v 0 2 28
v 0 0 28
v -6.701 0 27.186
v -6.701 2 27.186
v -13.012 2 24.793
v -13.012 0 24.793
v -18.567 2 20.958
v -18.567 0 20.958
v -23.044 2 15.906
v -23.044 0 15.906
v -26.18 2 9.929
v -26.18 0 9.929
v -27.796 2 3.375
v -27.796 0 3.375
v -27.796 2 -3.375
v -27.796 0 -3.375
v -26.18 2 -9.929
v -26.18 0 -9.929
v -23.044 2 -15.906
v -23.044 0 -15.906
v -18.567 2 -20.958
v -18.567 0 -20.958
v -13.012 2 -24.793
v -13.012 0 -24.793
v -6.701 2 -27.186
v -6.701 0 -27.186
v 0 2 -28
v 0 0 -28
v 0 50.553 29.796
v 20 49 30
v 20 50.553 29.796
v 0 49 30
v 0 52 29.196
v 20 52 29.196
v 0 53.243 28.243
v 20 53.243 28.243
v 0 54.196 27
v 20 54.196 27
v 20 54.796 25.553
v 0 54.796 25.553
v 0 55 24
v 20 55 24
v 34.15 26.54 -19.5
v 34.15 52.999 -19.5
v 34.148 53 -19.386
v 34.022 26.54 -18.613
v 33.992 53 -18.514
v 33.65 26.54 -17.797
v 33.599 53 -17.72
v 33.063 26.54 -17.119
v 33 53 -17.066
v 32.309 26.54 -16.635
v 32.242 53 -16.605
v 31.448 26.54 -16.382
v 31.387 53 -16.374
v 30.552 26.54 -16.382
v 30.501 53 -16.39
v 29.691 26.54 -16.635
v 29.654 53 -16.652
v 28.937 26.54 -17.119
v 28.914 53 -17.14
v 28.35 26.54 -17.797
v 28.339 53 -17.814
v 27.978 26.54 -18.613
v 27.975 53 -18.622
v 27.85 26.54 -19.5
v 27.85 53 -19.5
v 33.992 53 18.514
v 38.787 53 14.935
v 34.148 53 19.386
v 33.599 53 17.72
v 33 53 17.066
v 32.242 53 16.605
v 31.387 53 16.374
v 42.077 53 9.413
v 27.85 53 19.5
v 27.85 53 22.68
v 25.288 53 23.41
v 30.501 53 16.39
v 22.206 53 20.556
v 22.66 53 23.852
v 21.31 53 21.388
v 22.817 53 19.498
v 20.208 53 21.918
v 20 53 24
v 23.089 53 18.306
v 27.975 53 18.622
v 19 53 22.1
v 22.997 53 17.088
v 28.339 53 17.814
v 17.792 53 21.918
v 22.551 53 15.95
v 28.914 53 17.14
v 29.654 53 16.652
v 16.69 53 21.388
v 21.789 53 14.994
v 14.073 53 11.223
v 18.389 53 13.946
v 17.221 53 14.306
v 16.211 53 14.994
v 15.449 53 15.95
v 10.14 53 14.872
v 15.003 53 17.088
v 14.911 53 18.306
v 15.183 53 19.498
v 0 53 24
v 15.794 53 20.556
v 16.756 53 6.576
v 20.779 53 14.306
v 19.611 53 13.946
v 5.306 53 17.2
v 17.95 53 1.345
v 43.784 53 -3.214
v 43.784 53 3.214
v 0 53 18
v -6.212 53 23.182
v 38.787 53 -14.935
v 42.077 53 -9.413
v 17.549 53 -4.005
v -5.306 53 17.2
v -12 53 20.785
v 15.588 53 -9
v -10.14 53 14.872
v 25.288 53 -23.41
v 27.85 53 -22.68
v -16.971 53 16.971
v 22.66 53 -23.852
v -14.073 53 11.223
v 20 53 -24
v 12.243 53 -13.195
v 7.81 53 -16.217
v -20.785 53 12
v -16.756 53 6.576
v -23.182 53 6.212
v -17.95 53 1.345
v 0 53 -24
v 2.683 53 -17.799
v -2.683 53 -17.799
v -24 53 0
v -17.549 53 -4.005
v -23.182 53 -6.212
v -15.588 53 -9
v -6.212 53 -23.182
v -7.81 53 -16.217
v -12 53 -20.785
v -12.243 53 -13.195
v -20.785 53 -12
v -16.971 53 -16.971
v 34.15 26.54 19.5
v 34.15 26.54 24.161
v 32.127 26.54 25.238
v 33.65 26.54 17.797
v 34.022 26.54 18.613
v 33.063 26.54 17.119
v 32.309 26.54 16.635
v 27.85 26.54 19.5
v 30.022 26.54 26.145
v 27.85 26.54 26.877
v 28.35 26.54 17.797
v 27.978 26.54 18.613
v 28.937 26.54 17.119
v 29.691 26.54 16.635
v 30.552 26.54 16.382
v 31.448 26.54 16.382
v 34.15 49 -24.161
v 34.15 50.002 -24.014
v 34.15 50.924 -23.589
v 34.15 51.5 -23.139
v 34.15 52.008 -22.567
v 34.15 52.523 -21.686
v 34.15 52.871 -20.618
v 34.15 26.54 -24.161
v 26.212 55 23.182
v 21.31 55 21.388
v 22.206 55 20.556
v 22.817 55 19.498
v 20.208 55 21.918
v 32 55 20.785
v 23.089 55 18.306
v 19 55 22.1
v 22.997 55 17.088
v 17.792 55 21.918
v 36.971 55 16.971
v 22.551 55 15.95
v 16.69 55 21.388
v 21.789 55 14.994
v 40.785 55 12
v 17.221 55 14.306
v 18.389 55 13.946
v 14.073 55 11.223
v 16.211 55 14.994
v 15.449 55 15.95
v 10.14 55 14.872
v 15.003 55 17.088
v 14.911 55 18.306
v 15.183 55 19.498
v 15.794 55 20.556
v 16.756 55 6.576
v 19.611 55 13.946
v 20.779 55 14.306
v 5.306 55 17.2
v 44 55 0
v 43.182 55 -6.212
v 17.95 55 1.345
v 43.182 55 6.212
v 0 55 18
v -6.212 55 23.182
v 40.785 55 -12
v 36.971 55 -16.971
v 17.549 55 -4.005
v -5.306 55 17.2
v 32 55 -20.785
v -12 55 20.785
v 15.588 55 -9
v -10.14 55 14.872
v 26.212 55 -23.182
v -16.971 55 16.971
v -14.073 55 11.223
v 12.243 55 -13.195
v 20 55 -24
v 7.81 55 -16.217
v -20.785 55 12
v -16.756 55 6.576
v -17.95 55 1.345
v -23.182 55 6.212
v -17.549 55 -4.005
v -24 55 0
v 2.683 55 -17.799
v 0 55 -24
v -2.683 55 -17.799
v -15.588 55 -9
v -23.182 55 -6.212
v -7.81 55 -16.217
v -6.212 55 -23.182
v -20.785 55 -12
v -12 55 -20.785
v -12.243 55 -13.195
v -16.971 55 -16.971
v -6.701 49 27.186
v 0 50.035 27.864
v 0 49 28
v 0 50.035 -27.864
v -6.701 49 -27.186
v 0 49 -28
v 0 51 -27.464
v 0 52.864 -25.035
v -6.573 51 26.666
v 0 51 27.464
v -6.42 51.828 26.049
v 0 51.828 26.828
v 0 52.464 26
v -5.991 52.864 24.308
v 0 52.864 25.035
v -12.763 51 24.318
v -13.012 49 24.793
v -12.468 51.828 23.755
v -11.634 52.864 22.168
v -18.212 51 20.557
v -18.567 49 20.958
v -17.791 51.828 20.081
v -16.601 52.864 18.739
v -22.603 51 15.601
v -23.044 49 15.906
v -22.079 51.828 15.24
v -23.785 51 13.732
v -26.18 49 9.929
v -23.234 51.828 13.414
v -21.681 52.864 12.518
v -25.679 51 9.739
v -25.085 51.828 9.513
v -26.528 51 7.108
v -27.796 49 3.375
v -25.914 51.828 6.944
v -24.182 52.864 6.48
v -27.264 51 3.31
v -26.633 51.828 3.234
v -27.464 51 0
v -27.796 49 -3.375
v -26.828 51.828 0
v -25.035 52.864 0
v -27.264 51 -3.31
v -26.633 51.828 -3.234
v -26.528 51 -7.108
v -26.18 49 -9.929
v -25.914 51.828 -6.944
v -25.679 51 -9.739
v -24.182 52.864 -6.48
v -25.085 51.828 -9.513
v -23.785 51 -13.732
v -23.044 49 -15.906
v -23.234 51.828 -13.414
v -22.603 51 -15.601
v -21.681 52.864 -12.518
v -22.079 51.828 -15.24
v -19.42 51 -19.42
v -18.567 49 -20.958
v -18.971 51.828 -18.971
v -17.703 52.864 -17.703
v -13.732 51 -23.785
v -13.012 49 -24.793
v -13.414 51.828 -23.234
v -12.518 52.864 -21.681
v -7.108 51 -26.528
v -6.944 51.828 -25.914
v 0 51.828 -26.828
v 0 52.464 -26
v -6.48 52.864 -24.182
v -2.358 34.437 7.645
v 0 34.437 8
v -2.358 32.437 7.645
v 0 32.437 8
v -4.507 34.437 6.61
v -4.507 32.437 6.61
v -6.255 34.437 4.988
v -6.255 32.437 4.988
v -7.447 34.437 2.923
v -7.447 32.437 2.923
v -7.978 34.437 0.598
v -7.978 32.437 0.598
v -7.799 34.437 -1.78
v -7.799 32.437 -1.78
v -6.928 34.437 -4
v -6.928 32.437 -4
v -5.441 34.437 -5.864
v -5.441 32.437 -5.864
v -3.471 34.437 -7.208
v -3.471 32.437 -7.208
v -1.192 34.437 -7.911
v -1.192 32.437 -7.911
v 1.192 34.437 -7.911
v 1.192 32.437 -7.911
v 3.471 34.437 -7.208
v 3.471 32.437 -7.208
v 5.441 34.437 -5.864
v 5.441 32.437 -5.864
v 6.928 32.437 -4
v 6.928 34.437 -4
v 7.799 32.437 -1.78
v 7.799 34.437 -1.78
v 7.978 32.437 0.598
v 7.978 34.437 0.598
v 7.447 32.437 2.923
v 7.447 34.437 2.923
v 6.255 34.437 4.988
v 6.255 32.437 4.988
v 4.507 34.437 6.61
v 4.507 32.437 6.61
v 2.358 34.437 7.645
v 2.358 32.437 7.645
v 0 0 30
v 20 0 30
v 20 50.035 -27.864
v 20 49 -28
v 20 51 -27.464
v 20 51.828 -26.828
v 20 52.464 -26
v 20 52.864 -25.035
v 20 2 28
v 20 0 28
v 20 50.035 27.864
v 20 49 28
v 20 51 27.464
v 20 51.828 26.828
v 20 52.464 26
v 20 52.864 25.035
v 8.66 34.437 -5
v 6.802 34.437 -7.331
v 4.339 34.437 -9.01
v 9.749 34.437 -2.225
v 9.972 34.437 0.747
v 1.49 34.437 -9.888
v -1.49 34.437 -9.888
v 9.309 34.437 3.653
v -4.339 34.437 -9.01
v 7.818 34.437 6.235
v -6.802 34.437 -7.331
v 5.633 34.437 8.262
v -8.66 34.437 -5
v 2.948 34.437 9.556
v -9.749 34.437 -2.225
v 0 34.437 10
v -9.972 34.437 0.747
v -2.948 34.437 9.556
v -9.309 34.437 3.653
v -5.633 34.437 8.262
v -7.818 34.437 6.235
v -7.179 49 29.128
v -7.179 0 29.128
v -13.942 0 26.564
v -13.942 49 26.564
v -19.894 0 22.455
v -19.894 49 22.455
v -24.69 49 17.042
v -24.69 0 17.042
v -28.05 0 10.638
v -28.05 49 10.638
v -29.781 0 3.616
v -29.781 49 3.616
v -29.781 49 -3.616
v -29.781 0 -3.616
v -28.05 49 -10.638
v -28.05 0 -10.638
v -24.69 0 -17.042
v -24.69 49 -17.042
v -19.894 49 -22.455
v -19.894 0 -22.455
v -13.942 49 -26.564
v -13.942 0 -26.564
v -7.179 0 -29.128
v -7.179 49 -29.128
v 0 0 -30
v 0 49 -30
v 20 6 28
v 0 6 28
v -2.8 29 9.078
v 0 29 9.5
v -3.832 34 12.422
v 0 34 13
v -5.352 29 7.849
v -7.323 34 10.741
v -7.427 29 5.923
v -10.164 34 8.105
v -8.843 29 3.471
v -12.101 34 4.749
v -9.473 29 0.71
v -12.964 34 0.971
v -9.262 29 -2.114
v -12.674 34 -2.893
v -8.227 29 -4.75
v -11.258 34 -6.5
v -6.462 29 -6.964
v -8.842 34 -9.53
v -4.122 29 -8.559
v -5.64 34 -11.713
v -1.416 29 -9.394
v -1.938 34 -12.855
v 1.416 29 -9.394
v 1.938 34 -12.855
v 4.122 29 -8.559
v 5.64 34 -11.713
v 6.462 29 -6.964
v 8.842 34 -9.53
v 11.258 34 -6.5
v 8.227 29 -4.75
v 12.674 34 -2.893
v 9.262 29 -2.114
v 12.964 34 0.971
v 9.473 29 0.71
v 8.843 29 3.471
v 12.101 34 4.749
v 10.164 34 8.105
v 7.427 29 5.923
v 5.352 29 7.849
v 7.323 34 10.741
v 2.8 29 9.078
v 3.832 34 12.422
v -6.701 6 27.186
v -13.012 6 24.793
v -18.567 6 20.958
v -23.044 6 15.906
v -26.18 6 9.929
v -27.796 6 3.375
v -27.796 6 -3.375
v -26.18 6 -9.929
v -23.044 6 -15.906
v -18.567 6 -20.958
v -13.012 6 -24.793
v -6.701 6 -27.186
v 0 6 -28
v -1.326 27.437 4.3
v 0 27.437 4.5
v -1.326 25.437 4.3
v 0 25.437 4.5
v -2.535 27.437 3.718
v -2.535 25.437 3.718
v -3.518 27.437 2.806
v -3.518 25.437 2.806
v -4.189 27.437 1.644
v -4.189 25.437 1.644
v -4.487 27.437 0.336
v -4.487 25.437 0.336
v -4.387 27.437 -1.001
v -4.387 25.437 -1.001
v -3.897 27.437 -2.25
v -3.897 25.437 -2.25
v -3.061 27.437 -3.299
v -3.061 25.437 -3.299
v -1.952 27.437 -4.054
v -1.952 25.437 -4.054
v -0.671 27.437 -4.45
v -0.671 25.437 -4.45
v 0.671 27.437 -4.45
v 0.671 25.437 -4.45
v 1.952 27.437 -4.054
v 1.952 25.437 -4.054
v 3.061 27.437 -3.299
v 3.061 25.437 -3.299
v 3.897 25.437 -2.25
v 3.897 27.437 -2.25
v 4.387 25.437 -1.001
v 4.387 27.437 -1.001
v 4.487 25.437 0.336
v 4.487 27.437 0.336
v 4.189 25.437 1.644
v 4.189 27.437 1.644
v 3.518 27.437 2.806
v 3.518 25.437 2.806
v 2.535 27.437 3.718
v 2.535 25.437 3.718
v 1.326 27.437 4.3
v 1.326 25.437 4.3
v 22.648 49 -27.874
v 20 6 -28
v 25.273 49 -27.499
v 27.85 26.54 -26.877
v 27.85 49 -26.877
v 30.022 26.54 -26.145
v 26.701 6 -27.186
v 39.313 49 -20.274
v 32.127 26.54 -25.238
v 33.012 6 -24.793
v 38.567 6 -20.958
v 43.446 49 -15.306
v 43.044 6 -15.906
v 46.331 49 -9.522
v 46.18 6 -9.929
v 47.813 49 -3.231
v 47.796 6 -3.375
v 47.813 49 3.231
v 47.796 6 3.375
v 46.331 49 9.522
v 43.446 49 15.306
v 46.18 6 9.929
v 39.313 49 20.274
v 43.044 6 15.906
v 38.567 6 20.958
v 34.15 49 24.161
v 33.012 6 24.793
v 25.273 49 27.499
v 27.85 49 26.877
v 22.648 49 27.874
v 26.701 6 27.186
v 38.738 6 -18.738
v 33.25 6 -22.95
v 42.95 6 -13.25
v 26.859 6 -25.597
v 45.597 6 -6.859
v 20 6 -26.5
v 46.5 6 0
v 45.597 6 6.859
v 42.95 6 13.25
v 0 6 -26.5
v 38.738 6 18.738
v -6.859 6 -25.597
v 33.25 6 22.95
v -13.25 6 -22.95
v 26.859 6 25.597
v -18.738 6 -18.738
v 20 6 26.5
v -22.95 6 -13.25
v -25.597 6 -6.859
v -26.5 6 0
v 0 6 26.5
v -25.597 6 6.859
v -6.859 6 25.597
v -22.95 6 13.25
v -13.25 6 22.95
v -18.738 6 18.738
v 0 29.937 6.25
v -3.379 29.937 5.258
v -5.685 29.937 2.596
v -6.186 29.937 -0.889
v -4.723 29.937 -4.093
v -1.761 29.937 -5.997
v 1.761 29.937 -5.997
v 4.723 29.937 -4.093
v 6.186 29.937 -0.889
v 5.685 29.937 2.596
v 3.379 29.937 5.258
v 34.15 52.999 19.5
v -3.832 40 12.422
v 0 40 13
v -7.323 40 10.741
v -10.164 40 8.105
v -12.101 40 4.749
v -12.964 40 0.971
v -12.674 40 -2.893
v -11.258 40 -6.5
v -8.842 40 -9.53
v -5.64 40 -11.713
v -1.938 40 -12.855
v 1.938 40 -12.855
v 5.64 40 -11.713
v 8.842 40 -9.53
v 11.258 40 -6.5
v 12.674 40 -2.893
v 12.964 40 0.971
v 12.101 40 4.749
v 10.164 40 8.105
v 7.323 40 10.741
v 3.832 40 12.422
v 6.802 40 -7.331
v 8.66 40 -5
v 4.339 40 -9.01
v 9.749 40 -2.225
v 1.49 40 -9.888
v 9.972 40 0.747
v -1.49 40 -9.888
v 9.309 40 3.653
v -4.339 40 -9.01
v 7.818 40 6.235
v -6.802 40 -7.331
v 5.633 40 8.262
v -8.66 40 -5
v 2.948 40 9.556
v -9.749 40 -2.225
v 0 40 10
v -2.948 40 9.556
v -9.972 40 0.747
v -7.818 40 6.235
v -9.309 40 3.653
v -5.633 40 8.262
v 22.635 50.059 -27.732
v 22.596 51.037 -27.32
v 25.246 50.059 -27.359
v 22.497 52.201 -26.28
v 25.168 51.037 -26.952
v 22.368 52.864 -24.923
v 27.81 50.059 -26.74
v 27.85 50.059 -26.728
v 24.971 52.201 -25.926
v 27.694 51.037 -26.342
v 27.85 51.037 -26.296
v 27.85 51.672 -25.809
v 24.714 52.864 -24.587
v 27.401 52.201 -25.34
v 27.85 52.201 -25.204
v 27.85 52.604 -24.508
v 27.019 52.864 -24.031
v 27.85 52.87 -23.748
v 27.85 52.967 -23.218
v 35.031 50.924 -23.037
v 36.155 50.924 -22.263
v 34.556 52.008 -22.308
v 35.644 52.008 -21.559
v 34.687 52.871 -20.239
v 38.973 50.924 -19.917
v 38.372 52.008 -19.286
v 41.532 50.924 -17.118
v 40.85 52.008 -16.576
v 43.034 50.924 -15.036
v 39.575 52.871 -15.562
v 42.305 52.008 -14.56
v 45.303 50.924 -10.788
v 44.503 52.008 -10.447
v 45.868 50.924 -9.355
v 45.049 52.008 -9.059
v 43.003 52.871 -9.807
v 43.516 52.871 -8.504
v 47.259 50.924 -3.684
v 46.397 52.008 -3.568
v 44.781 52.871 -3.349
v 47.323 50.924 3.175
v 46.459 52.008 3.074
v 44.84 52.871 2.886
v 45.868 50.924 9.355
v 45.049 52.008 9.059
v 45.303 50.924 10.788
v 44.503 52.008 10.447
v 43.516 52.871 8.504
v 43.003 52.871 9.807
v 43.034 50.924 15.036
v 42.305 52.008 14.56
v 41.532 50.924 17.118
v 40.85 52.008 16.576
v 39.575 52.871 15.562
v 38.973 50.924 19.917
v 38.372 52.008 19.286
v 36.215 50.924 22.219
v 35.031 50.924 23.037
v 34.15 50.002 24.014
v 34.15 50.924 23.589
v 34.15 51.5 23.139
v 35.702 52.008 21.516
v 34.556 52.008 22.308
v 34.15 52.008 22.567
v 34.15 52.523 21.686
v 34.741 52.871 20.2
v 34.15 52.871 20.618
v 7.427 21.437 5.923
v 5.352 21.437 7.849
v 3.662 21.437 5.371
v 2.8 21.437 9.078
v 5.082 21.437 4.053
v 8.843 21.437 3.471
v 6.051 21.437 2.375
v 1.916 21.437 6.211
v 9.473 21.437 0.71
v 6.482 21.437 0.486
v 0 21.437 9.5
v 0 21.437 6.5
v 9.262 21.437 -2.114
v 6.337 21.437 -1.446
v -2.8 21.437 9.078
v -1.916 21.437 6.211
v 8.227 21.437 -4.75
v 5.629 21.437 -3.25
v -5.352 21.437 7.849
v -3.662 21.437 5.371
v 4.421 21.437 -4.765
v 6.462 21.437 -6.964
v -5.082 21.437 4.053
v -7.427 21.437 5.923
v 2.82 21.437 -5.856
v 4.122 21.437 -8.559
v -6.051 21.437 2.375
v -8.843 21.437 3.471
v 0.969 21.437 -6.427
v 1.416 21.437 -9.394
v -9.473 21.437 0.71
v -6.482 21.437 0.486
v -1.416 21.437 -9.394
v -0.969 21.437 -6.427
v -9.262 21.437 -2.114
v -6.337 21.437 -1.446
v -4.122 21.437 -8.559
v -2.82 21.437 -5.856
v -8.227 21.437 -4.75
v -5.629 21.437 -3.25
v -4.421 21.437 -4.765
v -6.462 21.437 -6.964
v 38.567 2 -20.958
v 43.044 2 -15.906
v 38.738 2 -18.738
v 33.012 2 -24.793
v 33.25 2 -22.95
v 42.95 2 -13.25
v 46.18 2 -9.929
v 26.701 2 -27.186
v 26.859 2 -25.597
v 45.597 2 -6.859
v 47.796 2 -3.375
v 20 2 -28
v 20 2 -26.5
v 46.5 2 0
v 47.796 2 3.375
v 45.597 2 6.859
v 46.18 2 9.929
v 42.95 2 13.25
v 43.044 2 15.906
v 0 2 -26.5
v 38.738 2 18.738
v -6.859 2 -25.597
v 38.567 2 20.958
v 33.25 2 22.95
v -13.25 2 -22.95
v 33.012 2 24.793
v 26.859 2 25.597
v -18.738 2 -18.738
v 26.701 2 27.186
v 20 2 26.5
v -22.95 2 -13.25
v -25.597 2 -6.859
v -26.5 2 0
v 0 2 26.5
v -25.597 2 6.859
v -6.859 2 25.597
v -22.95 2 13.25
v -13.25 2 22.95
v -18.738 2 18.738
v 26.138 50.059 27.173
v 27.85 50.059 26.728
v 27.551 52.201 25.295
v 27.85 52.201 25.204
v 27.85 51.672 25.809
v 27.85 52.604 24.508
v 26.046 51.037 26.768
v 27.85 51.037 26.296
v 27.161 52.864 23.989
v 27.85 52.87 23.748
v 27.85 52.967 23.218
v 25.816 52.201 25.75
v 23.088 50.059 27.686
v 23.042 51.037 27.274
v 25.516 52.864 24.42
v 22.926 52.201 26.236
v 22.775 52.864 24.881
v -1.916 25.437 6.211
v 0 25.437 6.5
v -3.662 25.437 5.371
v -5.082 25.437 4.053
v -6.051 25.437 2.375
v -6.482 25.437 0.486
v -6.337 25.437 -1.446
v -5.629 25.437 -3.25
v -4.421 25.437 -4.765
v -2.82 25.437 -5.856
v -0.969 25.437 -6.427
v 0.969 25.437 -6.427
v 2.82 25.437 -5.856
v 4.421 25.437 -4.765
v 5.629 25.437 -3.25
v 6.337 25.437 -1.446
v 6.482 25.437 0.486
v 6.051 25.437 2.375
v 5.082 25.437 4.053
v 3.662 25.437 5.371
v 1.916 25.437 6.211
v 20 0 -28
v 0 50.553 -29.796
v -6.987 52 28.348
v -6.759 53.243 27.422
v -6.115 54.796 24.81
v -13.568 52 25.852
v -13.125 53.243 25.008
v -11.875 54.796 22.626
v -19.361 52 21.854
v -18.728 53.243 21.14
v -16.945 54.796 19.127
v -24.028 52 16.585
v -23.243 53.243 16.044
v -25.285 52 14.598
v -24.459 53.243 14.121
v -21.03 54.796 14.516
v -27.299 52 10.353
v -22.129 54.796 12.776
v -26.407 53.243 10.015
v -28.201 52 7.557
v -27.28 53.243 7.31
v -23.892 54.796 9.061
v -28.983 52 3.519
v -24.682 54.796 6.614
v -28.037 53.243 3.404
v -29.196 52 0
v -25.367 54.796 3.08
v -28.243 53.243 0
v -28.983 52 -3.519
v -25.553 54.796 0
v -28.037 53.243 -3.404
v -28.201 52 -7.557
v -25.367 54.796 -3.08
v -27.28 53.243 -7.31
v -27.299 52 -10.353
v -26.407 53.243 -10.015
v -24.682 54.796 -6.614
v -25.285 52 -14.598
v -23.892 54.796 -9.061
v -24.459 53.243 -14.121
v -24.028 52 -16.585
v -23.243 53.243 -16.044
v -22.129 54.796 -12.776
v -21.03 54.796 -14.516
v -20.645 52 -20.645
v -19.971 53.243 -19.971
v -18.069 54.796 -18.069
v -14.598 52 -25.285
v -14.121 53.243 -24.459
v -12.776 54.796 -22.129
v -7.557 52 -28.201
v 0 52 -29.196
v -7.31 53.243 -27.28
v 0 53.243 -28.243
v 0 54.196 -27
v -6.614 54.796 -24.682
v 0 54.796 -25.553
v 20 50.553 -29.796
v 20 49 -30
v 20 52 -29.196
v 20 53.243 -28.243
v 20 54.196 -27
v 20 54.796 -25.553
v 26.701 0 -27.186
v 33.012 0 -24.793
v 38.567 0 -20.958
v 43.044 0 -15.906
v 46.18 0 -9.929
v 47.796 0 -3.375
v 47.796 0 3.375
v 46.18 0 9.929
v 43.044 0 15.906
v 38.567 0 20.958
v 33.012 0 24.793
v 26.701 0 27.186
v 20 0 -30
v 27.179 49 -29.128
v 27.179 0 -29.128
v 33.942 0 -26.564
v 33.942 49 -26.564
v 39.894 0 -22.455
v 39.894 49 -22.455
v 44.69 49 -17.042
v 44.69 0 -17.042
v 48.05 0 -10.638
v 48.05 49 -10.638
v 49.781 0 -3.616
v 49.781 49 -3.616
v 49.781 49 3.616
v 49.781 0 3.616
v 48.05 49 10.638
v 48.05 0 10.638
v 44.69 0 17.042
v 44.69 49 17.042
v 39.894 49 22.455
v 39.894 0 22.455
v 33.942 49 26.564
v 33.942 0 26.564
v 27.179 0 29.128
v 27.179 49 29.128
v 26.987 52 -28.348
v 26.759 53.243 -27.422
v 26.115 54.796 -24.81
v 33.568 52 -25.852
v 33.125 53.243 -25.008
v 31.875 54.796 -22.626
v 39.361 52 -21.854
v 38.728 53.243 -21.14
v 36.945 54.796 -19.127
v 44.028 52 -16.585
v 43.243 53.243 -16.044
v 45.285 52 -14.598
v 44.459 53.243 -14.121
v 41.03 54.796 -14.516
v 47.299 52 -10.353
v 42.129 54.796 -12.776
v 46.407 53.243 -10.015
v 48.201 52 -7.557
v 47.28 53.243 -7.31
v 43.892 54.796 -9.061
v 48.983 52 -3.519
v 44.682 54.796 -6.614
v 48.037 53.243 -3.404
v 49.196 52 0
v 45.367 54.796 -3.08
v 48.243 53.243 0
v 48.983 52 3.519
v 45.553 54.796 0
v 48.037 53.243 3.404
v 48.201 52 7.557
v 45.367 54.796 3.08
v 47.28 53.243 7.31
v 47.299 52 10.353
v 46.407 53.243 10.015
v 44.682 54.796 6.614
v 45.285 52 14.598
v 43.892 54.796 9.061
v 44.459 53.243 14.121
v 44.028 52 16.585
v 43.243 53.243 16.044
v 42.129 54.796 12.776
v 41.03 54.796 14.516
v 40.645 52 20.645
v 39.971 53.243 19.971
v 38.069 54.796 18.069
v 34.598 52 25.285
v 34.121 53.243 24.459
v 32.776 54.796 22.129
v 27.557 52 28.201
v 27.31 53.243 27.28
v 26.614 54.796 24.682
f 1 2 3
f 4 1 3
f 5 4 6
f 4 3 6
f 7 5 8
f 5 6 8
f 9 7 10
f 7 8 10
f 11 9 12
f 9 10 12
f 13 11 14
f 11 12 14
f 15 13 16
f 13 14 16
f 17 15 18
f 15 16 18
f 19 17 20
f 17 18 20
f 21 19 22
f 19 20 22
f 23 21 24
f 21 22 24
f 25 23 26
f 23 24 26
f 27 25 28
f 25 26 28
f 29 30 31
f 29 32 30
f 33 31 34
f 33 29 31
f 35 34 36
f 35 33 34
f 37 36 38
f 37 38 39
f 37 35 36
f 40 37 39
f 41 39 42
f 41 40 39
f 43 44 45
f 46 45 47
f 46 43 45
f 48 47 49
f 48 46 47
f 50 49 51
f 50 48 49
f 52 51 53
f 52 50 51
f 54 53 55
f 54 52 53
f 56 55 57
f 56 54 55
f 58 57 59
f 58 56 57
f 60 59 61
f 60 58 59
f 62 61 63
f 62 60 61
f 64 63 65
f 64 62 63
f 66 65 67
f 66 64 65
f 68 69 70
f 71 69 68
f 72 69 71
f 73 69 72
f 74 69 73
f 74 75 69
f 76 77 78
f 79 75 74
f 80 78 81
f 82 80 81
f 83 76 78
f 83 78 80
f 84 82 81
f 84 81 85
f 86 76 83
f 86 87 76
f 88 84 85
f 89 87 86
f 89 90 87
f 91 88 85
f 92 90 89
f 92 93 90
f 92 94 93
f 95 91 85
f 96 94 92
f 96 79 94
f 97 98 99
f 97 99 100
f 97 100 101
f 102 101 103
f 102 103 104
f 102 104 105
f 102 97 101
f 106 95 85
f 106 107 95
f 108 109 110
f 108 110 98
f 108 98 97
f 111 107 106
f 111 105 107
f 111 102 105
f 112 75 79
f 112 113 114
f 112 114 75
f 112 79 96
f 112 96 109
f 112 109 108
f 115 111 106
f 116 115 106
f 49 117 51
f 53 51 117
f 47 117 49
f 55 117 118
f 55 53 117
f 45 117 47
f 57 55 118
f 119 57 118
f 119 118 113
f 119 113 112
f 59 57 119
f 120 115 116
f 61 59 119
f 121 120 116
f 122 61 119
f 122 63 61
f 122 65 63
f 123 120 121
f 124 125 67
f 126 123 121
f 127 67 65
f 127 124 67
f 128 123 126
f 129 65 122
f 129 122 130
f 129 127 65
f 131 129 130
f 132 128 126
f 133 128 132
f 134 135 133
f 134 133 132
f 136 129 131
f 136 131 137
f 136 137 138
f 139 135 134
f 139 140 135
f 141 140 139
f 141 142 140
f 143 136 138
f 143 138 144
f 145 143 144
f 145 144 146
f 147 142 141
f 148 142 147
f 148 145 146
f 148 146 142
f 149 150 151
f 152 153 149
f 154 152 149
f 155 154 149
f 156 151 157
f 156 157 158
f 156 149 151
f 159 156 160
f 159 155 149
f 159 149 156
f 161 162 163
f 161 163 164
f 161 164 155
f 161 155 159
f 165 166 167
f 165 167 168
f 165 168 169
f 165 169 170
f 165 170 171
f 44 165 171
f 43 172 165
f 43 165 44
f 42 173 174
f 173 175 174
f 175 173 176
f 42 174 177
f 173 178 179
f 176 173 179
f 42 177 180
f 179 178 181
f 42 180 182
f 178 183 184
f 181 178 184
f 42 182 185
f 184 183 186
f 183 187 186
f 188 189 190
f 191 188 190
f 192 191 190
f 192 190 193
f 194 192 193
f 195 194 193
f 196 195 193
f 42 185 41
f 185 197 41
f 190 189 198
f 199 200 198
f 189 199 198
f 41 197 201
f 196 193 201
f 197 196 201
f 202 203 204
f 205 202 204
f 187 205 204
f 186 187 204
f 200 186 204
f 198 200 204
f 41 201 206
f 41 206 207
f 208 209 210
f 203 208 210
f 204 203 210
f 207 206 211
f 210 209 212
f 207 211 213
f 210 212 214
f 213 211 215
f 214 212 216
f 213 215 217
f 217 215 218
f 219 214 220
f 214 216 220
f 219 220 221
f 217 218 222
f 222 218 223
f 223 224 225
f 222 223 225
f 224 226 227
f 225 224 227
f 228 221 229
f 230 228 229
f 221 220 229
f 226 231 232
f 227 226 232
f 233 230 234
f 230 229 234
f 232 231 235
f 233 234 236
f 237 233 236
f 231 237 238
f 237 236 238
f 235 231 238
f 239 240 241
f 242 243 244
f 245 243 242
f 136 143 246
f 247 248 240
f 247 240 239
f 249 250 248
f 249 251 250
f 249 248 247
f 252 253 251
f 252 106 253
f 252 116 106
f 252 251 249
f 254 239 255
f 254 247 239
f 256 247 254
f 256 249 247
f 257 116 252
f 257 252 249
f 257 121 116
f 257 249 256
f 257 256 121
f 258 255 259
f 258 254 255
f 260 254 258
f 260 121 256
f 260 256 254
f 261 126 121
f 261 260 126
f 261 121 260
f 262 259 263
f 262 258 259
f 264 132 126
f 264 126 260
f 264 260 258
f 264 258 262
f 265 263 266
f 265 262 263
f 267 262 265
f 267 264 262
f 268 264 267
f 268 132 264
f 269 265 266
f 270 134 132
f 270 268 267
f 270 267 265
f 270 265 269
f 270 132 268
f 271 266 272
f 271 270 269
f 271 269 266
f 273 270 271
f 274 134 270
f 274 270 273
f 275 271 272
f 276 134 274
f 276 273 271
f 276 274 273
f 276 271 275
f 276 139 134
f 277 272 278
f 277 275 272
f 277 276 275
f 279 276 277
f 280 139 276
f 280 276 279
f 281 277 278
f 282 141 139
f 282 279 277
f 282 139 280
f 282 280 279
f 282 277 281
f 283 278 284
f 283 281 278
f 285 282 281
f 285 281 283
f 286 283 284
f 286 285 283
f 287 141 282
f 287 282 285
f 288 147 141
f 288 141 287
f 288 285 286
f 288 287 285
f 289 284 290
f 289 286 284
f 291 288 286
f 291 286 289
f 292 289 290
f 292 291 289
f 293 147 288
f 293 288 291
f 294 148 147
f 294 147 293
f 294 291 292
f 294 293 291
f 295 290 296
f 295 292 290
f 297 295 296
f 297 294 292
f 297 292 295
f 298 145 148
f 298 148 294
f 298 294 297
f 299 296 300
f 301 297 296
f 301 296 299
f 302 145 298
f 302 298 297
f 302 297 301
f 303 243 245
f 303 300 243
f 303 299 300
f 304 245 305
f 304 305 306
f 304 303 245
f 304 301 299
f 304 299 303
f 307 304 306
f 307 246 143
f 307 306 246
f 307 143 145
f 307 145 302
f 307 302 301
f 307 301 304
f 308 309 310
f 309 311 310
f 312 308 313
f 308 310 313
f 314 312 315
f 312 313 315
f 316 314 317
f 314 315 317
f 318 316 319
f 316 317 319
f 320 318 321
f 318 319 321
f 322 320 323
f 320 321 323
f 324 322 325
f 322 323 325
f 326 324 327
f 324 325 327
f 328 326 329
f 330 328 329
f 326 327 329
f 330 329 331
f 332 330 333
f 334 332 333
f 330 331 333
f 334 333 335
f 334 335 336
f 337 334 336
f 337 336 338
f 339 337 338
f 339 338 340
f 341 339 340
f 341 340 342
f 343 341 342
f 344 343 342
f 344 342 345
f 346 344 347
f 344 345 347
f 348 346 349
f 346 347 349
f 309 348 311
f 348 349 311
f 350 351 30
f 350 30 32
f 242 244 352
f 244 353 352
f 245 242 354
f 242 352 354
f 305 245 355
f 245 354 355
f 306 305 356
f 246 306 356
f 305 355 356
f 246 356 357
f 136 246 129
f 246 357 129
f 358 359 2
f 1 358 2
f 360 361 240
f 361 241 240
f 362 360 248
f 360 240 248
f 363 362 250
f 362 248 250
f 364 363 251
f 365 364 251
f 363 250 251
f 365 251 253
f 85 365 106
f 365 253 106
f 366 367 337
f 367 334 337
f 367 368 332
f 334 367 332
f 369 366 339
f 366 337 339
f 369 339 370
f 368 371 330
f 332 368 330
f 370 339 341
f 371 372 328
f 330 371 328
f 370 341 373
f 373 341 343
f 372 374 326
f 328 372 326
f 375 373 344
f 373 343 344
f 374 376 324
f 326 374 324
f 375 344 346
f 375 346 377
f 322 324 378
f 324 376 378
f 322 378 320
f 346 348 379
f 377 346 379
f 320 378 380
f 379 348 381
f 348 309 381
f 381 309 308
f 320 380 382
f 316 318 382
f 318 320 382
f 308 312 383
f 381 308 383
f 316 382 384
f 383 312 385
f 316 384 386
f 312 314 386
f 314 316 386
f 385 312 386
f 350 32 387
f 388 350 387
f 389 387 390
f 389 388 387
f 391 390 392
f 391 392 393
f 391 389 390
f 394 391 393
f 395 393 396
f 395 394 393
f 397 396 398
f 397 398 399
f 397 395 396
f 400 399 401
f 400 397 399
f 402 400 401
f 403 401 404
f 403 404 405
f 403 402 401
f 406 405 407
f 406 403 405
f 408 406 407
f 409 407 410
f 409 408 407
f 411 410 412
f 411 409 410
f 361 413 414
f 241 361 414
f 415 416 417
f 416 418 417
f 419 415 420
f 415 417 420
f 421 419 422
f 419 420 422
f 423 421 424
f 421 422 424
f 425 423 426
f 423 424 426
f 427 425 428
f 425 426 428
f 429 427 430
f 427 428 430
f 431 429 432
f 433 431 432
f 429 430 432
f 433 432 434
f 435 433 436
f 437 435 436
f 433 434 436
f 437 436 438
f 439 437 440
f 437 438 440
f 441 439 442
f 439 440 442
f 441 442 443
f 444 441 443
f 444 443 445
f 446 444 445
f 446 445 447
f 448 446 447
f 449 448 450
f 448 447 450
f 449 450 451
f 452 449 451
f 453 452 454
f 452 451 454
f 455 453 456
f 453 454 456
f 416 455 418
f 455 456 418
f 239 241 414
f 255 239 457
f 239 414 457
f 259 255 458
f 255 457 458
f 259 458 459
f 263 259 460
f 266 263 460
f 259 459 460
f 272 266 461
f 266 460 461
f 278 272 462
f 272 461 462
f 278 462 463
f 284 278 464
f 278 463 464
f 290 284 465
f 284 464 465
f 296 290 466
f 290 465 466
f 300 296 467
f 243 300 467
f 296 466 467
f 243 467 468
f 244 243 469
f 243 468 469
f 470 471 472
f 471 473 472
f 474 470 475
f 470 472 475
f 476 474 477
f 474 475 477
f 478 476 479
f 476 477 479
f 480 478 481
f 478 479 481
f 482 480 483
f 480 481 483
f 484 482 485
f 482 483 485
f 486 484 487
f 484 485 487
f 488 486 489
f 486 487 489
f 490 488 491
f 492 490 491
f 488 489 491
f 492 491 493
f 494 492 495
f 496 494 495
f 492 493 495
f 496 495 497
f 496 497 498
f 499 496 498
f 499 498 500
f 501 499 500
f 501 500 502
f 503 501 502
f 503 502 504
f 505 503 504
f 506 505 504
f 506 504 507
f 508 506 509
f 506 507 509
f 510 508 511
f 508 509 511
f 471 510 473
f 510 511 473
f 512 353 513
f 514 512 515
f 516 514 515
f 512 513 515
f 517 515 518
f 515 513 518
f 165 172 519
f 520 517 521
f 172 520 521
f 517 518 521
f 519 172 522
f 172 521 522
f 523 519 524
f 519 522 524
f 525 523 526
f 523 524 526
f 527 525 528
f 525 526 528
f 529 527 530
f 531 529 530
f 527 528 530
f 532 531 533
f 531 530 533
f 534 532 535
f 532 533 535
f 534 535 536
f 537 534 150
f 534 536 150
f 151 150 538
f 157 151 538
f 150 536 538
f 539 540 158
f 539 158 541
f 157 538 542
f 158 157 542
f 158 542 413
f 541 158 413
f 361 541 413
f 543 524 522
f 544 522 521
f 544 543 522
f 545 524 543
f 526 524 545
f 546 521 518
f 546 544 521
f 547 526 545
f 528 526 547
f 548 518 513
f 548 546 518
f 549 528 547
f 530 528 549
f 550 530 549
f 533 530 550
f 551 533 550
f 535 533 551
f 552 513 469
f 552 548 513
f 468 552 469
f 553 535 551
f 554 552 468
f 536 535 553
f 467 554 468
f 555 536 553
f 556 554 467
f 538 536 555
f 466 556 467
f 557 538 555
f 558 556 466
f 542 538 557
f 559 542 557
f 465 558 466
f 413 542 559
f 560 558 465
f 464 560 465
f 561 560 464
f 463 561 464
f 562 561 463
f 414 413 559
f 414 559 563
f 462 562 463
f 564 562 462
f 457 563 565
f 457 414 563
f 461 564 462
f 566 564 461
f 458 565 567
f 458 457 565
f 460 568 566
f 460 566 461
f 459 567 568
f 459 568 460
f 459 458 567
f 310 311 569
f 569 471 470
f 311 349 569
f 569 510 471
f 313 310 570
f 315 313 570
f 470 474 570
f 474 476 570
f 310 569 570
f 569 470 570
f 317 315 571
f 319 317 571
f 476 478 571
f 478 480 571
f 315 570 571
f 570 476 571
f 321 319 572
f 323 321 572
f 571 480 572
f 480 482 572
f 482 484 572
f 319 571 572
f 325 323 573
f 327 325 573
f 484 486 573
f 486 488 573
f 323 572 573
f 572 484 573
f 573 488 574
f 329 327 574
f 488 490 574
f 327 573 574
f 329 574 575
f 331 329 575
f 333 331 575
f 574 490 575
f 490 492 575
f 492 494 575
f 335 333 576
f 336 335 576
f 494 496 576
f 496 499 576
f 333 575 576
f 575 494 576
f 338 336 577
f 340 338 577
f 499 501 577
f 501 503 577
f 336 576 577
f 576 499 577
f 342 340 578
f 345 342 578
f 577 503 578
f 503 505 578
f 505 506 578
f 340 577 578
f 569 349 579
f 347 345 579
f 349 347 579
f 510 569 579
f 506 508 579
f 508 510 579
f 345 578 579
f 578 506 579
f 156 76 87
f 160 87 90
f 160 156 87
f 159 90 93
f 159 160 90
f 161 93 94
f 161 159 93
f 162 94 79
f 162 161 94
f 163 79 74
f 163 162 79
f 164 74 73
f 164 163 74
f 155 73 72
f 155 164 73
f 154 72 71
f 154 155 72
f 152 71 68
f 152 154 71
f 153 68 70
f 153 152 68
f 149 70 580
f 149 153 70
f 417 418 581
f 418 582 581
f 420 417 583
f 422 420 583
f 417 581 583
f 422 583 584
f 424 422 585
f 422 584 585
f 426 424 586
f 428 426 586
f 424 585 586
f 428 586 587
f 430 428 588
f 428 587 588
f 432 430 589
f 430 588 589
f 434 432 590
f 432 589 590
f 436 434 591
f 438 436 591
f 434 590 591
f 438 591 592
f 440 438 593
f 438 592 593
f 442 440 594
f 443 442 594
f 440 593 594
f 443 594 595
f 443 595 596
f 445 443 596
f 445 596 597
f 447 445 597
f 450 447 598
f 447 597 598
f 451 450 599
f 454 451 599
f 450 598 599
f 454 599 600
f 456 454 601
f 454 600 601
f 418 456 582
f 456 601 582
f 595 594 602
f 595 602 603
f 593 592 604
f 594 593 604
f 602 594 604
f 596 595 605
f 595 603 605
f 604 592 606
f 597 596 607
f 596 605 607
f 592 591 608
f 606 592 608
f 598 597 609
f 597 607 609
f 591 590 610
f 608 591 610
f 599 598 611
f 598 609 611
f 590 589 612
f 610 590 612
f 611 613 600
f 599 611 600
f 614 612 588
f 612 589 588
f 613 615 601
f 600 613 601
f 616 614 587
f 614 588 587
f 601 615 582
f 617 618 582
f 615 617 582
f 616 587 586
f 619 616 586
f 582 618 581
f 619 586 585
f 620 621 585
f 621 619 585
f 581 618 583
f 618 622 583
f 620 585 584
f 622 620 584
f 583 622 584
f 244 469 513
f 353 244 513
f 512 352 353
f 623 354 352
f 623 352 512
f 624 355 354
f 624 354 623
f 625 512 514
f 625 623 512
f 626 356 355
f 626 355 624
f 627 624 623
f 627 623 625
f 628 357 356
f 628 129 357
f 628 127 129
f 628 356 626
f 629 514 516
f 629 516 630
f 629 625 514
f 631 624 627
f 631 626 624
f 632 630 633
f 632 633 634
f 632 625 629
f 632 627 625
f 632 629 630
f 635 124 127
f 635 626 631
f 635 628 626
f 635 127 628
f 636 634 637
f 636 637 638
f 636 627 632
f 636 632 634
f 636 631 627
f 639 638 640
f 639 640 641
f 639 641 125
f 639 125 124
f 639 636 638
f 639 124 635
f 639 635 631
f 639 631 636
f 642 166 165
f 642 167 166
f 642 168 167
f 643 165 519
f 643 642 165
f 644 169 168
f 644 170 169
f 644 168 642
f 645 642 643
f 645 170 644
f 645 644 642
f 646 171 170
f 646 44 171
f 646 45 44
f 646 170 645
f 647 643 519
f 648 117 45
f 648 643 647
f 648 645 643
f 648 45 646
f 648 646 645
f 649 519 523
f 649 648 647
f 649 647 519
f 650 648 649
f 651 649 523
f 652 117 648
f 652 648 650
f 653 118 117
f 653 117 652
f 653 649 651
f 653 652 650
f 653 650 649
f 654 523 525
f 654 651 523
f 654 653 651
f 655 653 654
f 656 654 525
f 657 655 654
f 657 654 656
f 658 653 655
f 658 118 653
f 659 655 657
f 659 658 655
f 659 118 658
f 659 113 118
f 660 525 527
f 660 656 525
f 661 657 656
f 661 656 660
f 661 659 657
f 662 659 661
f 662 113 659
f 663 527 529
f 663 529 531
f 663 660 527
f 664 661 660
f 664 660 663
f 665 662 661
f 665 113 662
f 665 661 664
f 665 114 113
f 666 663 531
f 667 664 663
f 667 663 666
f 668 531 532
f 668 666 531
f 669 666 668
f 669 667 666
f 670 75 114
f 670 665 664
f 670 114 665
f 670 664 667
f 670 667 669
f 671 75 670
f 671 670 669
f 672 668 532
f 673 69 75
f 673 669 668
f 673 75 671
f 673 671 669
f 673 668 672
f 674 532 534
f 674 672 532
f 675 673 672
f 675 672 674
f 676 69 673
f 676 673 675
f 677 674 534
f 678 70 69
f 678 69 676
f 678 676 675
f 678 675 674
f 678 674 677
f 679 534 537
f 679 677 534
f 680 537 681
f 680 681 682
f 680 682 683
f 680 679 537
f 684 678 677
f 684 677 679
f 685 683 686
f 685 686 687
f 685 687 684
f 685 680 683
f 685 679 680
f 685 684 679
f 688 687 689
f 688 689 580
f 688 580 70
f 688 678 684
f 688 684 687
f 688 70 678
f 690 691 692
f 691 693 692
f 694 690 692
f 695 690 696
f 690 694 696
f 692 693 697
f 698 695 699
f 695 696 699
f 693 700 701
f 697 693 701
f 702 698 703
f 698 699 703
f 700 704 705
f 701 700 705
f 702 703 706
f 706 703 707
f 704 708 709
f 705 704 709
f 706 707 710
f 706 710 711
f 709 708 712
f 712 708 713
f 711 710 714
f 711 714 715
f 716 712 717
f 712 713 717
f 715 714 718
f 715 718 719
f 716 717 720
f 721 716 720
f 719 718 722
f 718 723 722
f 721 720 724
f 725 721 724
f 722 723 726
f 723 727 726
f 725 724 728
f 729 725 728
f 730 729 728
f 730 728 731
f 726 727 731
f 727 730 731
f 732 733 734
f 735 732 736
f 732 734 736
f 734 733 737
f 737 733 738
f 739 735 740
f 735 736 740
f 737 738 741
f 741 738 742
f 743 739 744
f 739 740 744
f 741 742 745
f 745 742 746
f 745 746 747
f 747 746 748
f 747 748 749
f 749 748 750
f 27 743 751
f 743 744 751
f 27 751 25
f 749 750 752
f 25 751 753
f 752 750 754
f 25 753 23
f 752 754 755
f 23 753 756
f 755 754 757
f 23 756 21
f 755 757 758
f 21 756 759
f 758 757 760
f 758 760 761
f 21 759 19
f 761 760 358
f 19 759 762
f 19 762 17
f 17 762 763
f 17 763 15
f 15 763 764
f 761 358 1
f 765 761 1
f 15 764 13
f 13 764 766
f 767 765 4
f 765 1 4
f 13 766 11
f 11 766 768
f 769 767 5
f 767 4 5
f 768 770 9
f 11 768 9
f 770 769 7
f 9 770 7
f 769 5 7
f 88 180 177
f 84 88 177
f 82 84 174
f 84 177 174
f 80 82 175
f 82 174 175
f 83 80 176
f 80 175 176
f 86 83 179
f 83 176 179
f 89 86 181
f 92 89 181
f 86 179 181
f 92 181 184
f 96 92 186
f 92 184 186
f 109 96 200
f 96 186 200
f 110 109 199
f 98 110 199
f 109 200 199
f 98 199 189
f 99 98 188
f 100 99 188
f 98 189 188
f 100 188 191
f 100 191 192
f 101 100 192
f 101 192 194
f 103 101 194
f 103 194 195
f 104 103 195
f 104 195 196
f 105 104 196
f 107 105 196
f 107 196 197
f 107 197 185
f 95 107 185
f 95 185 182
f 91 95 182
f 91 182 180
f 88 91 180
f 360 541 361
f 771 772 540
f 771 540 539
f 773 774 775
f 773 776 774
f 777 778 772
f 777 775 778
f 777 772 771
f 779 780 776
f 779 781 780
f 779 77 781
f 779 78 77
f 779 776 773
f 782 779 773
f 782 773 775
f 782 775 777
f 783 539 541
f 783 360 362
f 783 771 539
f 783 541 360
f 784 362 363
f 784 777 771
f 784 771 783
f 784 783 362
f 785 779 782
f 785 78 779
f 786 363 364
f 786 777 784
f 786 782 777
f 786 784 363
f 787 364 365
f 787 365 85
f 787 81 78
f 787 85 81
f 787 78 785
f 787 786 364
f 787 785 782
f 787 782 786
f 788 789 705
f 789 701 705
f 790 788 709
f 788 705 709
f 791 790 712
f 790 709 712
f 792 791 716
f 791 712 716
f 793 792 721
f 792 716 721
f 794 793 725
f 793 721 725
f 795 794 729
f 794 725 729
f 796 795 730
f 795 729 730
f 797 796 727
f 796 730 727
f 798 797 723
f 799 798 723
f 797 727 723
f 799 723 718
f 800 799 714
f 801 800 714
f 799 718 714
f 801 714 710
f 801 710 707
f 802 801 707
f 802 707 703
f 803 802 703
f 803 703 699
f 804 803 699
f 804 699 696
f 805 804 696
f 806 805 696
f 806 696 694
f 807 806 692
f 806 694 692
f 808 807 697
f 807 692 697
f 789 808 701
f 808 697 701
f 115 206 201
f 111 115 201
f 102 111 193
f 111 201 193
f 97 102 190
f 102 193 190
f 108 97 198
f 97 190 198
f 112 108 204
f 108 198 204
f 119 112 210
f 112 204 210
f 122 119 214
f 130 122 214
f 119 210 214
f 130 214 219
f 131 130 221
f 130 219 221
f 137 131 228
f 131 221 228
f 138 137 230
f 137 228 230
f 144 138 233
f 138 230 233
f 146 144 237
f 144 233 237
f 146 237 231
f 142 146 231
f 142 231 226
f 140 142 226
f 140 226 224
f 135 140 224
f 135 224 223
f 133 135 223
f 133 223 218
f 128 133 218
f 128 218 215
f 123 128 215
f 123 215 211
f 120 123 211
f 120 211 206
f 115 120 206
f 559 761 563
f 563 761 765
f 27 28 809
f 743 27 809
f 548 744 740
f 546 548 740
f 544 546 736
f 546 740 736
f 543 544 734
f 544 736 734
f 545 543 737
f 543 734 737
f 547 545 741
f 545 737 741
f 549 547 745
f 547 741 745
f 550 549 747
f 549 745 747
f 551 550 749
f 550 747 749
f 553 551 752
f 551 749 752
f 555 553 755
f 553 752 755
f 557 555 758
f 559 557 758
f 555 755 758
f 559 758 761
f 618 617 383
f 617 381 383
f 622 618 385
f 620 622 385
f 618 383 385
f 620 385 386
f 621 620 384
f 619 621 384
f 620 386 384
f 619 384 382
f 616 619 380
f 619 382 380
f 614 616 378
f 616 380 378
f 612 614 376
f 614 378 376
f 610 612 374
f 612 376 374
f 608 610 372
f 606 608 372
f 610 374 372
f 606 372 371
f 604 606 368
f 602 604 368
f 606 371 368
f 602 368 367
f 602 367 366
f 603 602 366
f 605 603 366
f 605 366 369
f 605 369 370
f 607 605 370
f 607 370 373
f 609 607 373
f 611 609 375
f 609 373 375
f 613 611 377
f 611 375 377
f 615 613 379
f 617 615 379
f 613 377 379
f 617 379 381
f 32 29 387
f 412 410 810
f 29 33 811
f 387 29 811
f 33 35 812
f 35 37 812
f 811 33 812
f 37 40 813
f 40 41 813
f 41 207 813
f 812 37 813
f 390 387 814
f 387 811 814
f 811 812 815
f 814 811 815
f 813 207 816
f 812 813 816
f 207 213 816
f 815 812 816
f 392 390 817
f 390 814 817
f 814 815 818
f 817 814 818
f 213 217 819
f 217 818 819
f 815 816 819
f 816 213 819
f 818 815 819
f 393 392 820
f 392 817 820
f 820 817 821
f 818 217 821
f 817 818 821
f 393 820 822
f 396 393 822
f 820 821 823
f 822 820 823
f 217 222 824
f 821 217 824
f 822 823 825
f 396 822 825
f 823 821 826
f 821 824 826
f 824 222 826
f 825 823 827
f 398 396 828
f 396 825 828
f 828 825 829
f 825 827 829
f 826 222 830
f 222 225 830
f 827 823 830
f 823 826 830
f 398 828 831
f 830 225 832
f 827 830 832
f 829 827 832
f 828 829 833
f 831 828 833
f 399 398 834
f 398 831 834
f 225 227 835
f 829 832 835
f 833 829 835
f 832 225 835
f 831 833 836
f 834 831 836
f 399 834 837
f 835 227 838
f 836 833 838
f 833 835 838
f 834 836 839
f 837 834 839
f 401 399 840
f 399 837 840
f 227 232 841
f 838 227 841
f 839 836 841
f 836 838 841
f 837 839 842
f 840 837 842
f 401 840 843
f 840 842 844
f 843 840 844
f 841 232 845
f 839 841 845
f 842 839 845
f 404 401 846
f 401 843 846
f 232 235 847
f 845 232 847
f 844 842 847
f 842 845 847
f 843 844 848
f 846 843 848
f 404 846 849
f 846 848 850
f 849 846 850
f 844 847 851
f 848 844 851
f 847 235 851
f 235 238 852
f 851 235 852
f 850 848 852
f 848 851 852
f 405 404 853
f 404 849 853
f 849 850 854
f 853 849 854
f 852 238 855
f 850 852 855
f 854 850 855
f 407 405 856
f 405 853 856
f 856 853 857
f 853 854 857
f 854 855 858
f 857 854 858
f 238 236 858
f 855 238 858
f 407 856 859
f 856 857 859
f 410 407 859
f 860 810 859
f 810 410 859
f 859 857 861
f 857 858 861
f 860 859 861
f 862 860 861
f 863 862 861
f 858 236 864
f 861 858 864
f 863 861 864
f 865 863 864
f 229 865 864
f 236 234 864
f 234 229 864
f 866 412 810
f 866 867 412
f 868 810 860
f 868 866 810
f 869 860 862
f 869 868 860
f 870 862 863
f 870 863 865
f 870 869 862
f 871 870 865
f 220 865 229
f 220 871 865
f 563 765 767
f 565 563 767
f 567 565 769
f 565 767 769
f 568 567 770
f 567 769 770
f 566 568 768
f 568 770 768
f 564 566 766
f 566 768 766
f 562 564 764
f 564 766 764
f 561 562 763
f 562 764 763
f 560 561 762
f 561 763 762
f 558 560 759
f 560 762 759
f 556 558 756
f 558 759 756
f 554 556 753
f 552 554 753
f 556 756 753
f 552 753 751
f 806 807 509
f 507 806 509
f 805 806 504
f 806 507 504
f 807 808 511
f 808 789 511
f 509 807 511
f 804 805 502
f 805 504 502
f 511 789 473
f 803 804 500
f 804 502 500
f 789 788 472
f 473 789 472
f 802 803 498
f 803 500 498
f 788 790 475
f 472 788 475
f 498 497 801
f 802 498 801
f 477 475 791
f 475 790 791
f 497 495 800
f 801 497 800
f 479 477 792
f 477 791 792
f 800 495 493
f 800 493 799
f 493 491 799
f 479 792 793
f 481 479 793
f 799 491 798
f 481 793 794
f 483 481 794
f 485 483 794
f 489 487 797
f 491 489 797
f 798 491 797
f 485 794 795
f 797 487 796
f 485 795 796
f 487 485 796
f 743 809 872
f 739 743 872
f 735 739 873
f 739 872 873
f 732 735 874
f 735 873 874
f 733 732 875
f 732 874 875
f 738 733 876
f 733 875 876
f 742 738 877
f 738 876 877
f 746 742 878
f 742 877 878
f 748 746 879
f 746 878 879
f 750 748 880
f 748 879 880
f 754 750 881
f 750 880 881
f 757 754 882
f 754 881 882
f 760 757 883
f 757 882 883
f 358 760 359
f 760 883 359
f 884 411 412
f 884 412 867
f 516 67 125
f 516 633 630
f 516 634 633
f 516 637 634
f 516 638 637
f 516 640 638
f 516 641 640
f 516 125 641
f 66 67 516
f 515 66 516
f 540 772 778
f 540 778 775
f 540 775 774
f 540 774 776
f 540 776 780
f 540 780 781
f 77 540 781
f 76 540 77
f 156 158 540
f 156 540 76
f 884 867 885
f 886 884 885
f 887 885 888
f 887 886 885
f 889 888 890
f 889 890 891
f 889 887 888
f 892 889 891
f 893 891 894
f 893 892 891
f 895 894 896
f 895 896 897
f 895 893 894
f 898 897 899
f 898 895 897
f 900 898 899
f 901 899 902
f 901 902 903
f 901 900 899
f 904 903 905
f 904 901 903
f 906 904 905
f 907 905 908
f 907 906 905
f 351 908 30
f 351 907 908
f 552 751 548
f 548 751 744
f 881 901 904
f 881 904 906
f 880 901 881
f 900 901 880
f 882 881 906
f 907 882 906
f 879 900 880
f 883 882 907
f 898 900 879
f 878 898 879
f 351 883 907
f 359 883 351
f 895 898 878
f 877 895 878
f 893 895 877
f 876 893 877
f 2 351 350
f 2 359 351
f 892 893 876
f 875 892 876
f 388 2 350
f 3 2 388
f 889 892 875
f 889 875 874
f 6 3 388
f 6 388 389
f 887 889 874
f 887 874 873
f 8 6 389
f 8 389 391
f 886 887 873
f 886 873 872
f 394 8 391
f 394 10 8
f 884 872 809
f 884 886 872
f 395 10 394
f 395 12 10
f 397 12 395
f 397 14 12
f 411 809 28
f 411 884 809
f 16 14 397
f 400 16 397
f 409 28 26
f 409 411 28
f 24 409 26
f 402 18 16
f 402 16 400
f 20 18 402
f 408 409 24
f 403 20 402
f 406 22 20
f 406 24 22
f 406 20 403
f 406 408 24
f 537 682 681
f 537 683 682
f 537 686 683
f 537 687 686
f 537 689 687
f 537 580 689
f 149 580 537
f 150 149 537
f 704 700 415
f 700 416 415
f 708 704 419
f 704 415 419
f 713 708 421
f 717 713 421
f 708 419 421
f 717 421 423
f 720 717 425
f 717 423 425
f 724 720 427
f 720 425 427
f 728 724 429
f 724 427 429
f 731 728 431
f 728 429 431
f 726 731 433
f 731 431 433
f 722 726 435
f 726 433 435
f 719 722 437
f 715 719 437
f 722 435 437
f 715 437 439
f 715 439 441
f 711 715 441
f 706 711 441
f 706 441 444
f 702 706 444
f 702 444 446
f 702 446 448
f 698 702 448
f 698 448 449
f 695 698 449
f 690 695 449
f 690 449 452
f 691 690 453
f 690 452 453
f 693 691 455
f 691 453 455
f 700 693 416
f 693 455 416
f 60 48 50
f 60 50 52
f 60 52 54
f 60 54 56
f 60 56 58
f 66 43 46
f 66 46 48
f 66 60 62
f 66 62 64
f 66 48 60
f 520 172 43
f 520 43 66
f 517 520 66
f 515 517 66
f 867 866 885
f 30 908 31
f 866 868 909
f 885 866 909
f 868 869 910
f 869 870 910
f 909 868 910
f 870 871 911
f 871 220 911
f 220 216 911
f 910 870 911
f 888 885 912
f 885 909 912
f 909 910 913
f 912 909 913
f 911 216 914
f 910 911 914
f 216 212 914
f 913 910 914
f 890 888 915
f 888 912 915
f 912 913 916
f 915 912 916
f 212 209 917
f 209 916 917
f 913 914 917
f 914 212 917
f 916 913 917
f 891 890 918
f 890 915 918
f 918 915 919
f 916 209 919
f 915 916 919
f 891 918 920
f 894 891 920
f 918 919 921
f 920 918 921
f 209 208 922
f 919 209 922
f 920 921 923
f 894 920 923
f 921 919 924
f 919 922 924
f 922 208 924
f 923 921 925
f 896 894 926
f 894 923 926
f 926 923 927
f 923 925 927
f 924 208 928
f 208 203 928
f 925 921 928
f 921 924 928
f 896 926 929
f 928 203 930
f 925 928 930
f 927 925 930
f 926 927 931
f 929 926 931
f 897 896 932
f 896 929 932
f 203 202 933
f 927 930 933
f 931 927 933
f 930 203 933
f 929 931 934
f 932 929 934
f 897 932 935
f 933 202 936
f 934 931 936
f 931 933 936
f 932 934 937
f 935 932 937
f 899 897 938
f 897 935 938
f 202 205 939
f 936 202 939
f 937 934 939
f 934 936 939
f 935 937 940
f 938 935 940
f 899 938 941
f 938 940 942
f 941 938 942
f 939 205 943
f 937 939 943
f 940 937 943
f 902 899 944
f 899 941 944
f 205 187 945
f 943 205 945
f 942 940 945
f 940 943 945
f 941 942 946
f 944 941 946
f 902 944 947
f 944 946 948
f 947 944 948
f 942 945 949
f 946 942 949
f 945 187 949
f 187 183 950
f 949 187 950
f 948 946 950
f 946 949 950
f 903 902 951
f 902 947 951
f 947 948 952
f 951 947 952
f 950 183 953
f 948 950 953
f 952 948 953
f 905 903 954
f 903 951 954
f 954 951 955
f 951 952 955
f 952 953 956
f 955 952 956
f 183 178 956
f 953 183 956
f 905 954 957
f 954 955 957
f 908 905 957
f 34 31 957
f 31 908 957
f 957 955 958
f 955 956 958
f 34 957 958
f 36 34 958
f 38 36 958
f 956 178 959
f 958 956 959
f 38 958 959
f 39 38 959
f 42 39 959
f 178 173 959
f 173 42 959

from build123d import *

# Parameters (mm, degrees)
EXTRUDE_1_DEPTH     = 55
FILLET_1_R          = 6
SHELL_3_T           = -2
SKETCH_3_R          = 18
CUT_EXTRUDE_1_DEPTH = 81.156097747
EXTRUDE_2_REACH     = 66.884
SKETCH_7_R          = 4.1
CUT_EXTRUDE_2_DEPTH = 81.156097747
EXTRUDE_START       = -2
EXTRUDE_3_DEPTH     = 4


with BuildPart() as part:
    # 草图2 → 凸台-拉伸1 (new body)
    with BuildSketch(Plane(origin=(0, 0, 0), x_dir=(1, 0, 0), z_dir=(0, 1, 0))):
        with BuildLine():
            Line((0, 30), (20, 30))
            ThreePointArc((20, 30), (50, 0), (20, -30))
            Line((20, -30), (0, -30))
            ThreePointArc((0, -30), (-30, 0), (0, 30))
        make_face()
    extrude(amount=EXTRUDE_1_DEPTH)

    # 圆角1
    fillet_1_edges = [part.edges().sort_by_distance(p)[0] for p in [
        (50, 55, 0),
        (10, 55, -30),
        (-30, 55, 0),
        (10, 55, 30),
    ]]
    fillet(fillet_1_edges, radius=FILLET_1_R)

    # 抽壳3
    shell_3_openings = [part.faces().sort_by_distance(p)[0] for p in [
        (10, 0, 0),
    ]]
    offset(amount=SHELL_3_T, openings=shell_3_openings, kind=Kind.INTERSECTION)

    # 草图3 → 切除-拉伸1 (cut, through all)
    with BuildSketch(Plane(origin=(0, 55, 0), x_dir=(1, 0, 0), z_dir=(0, 1, 0))):
        with Locations(Location((0, 0, 0), (0, 0, 270))):
            Circle(SKETCH_3_R)
    extrude(amount=-CUT_EXTRUDE_1_DEPTH, mode=Mode.SUBTRACT)

    # 草图6 → 凸台-拉伸2 (add, up to next)
    with BuildSketch(Plane(origin=(0, 26.54, 0), x_dir=(-1, 0, 0), z_dir=(0, -1, 0)), mode=Mode.PRIVATE) as extrude_2_sk1:
        with BuildLine():
            ThreePointArc((-27.85, 28.954749179), (-31.070876302, 27.882533922), (-34.15, 26.453307922))
            Line((-34.15, 26.453307922), (-34.15, 19.5))
            ThreePointArc((-34.15, 19.5), (-31, 16.35), (-27.85, 19.5))
            Line((-27.85, 19.5), (-27.85, 28.954749179))
        make_face()
    extrude_2_tool1 = extrude(extrude_2_sk1.sketch, amount=-EXTRUDE_2_REACH, mode=Mode.PRIVATE) - part.part
    # 草图6 → 凸台-拉伸2 (add, up to next)
    with BuildSketch(Plane(origin=(0, 26.54, 0), x_dir=(-1, 0, 0), z_dir=(0, -1, 0)), mode=Mode.PRIVATE) as extrude_2_sk2:
        with BuildLine():
            Line((-27.85, -28.954749179), (-27.85, -19.5))
            ThreePointArc((-27.85, -19.5), (-31, -16.35), (-34.15, -19.5))
            Line((-34.15, -19.5), (-34.15, -26.453307922))
            ThreePointArc((-34.15, -26.453307922), (-31.070876302, -27.882533922), (-27.85, -28.954749179))
        make_face()
    extrude_2_tool2 = extrude(extrude_2_sk2.sketch, amount=-EXTRUDE_2_REACH, mode=Mode.PRIVATE) - part.part
    add(extrude_2_tool1.solids().sort_by_distance((30.878942, 26.54, -22.435225))[0])
    add(extrude_2_tool2.solids().sort_by_distance((30.878942, 26.54, 22.435225))[0])

    # 草图7 → 切除-拉伸2 (cut, through all)
    with BuildSketch(Plane(origin=(0, 55, 0), x_dir=(1, 0, 0), z_dir=(0, 1, 0))):
        with Locations(Location((19, -18, 0), (0, 0, 270))):
            Circle(SKETCH_7_R)
    extrude(amount=-CUT_EXTRUDE_2_DEPTH, mode=Mode.SUBTRACT)

    # 草图8 → 凸台-拉伸3 (add)
    with BuildSketch(Plane.XZ.offset(EXTRUDE_START)):
        with BuildLine():
            Line((20, -28), (0, -28))
            ThreePointArc((0, -28), (-28, 0), (0, 28))
            Line((0, 28), (20, 28))
            ThreePointArc((20, 28), (48, 0), (20, -28))
        make_face()
        with BuildLine():
            ThreePointArc((20, -26.5), (46.5, 0), (20, 26.5))
            Line((20, 26.5), (0, 26.5))
            ThreePointArc((0, 26.5), (-26.5, 0), (0, -26.5))
            Line((0, -26.5), (20, -26.5))
        make_face(mode=Mode.SUBTRACT)
    extrude(amount=-EXTRUDE_3_DEPTH)


with BuildPart() as body_2:
    # 草图5 → 旋转1 (revolve)
    with BuildSketch(Plane.XY, mode=Mode.PRIVATE) as revolve_1_sk:
        Polygon((-10, 40), (-10, 34.437282567), (-8, 34.437282567), (-8, 32.437282567), (-4.5, 27.437282567), (-4.5, 25.437282567), (-6.5, 25.437282567), (-6.5, 21.437282567), (-9.5, 21.437282567), (-9.5, 29), (-13, 34), (-13, 40), align=None)
    revolve(revolve_1_sk.sketch.rotate(Axis((0, 40, 0), (0, -1, 0)), 270), axis=Axis((0, 40, 0), (0, -1, 0)))


solid = Compound([part.part, body_2.part])
